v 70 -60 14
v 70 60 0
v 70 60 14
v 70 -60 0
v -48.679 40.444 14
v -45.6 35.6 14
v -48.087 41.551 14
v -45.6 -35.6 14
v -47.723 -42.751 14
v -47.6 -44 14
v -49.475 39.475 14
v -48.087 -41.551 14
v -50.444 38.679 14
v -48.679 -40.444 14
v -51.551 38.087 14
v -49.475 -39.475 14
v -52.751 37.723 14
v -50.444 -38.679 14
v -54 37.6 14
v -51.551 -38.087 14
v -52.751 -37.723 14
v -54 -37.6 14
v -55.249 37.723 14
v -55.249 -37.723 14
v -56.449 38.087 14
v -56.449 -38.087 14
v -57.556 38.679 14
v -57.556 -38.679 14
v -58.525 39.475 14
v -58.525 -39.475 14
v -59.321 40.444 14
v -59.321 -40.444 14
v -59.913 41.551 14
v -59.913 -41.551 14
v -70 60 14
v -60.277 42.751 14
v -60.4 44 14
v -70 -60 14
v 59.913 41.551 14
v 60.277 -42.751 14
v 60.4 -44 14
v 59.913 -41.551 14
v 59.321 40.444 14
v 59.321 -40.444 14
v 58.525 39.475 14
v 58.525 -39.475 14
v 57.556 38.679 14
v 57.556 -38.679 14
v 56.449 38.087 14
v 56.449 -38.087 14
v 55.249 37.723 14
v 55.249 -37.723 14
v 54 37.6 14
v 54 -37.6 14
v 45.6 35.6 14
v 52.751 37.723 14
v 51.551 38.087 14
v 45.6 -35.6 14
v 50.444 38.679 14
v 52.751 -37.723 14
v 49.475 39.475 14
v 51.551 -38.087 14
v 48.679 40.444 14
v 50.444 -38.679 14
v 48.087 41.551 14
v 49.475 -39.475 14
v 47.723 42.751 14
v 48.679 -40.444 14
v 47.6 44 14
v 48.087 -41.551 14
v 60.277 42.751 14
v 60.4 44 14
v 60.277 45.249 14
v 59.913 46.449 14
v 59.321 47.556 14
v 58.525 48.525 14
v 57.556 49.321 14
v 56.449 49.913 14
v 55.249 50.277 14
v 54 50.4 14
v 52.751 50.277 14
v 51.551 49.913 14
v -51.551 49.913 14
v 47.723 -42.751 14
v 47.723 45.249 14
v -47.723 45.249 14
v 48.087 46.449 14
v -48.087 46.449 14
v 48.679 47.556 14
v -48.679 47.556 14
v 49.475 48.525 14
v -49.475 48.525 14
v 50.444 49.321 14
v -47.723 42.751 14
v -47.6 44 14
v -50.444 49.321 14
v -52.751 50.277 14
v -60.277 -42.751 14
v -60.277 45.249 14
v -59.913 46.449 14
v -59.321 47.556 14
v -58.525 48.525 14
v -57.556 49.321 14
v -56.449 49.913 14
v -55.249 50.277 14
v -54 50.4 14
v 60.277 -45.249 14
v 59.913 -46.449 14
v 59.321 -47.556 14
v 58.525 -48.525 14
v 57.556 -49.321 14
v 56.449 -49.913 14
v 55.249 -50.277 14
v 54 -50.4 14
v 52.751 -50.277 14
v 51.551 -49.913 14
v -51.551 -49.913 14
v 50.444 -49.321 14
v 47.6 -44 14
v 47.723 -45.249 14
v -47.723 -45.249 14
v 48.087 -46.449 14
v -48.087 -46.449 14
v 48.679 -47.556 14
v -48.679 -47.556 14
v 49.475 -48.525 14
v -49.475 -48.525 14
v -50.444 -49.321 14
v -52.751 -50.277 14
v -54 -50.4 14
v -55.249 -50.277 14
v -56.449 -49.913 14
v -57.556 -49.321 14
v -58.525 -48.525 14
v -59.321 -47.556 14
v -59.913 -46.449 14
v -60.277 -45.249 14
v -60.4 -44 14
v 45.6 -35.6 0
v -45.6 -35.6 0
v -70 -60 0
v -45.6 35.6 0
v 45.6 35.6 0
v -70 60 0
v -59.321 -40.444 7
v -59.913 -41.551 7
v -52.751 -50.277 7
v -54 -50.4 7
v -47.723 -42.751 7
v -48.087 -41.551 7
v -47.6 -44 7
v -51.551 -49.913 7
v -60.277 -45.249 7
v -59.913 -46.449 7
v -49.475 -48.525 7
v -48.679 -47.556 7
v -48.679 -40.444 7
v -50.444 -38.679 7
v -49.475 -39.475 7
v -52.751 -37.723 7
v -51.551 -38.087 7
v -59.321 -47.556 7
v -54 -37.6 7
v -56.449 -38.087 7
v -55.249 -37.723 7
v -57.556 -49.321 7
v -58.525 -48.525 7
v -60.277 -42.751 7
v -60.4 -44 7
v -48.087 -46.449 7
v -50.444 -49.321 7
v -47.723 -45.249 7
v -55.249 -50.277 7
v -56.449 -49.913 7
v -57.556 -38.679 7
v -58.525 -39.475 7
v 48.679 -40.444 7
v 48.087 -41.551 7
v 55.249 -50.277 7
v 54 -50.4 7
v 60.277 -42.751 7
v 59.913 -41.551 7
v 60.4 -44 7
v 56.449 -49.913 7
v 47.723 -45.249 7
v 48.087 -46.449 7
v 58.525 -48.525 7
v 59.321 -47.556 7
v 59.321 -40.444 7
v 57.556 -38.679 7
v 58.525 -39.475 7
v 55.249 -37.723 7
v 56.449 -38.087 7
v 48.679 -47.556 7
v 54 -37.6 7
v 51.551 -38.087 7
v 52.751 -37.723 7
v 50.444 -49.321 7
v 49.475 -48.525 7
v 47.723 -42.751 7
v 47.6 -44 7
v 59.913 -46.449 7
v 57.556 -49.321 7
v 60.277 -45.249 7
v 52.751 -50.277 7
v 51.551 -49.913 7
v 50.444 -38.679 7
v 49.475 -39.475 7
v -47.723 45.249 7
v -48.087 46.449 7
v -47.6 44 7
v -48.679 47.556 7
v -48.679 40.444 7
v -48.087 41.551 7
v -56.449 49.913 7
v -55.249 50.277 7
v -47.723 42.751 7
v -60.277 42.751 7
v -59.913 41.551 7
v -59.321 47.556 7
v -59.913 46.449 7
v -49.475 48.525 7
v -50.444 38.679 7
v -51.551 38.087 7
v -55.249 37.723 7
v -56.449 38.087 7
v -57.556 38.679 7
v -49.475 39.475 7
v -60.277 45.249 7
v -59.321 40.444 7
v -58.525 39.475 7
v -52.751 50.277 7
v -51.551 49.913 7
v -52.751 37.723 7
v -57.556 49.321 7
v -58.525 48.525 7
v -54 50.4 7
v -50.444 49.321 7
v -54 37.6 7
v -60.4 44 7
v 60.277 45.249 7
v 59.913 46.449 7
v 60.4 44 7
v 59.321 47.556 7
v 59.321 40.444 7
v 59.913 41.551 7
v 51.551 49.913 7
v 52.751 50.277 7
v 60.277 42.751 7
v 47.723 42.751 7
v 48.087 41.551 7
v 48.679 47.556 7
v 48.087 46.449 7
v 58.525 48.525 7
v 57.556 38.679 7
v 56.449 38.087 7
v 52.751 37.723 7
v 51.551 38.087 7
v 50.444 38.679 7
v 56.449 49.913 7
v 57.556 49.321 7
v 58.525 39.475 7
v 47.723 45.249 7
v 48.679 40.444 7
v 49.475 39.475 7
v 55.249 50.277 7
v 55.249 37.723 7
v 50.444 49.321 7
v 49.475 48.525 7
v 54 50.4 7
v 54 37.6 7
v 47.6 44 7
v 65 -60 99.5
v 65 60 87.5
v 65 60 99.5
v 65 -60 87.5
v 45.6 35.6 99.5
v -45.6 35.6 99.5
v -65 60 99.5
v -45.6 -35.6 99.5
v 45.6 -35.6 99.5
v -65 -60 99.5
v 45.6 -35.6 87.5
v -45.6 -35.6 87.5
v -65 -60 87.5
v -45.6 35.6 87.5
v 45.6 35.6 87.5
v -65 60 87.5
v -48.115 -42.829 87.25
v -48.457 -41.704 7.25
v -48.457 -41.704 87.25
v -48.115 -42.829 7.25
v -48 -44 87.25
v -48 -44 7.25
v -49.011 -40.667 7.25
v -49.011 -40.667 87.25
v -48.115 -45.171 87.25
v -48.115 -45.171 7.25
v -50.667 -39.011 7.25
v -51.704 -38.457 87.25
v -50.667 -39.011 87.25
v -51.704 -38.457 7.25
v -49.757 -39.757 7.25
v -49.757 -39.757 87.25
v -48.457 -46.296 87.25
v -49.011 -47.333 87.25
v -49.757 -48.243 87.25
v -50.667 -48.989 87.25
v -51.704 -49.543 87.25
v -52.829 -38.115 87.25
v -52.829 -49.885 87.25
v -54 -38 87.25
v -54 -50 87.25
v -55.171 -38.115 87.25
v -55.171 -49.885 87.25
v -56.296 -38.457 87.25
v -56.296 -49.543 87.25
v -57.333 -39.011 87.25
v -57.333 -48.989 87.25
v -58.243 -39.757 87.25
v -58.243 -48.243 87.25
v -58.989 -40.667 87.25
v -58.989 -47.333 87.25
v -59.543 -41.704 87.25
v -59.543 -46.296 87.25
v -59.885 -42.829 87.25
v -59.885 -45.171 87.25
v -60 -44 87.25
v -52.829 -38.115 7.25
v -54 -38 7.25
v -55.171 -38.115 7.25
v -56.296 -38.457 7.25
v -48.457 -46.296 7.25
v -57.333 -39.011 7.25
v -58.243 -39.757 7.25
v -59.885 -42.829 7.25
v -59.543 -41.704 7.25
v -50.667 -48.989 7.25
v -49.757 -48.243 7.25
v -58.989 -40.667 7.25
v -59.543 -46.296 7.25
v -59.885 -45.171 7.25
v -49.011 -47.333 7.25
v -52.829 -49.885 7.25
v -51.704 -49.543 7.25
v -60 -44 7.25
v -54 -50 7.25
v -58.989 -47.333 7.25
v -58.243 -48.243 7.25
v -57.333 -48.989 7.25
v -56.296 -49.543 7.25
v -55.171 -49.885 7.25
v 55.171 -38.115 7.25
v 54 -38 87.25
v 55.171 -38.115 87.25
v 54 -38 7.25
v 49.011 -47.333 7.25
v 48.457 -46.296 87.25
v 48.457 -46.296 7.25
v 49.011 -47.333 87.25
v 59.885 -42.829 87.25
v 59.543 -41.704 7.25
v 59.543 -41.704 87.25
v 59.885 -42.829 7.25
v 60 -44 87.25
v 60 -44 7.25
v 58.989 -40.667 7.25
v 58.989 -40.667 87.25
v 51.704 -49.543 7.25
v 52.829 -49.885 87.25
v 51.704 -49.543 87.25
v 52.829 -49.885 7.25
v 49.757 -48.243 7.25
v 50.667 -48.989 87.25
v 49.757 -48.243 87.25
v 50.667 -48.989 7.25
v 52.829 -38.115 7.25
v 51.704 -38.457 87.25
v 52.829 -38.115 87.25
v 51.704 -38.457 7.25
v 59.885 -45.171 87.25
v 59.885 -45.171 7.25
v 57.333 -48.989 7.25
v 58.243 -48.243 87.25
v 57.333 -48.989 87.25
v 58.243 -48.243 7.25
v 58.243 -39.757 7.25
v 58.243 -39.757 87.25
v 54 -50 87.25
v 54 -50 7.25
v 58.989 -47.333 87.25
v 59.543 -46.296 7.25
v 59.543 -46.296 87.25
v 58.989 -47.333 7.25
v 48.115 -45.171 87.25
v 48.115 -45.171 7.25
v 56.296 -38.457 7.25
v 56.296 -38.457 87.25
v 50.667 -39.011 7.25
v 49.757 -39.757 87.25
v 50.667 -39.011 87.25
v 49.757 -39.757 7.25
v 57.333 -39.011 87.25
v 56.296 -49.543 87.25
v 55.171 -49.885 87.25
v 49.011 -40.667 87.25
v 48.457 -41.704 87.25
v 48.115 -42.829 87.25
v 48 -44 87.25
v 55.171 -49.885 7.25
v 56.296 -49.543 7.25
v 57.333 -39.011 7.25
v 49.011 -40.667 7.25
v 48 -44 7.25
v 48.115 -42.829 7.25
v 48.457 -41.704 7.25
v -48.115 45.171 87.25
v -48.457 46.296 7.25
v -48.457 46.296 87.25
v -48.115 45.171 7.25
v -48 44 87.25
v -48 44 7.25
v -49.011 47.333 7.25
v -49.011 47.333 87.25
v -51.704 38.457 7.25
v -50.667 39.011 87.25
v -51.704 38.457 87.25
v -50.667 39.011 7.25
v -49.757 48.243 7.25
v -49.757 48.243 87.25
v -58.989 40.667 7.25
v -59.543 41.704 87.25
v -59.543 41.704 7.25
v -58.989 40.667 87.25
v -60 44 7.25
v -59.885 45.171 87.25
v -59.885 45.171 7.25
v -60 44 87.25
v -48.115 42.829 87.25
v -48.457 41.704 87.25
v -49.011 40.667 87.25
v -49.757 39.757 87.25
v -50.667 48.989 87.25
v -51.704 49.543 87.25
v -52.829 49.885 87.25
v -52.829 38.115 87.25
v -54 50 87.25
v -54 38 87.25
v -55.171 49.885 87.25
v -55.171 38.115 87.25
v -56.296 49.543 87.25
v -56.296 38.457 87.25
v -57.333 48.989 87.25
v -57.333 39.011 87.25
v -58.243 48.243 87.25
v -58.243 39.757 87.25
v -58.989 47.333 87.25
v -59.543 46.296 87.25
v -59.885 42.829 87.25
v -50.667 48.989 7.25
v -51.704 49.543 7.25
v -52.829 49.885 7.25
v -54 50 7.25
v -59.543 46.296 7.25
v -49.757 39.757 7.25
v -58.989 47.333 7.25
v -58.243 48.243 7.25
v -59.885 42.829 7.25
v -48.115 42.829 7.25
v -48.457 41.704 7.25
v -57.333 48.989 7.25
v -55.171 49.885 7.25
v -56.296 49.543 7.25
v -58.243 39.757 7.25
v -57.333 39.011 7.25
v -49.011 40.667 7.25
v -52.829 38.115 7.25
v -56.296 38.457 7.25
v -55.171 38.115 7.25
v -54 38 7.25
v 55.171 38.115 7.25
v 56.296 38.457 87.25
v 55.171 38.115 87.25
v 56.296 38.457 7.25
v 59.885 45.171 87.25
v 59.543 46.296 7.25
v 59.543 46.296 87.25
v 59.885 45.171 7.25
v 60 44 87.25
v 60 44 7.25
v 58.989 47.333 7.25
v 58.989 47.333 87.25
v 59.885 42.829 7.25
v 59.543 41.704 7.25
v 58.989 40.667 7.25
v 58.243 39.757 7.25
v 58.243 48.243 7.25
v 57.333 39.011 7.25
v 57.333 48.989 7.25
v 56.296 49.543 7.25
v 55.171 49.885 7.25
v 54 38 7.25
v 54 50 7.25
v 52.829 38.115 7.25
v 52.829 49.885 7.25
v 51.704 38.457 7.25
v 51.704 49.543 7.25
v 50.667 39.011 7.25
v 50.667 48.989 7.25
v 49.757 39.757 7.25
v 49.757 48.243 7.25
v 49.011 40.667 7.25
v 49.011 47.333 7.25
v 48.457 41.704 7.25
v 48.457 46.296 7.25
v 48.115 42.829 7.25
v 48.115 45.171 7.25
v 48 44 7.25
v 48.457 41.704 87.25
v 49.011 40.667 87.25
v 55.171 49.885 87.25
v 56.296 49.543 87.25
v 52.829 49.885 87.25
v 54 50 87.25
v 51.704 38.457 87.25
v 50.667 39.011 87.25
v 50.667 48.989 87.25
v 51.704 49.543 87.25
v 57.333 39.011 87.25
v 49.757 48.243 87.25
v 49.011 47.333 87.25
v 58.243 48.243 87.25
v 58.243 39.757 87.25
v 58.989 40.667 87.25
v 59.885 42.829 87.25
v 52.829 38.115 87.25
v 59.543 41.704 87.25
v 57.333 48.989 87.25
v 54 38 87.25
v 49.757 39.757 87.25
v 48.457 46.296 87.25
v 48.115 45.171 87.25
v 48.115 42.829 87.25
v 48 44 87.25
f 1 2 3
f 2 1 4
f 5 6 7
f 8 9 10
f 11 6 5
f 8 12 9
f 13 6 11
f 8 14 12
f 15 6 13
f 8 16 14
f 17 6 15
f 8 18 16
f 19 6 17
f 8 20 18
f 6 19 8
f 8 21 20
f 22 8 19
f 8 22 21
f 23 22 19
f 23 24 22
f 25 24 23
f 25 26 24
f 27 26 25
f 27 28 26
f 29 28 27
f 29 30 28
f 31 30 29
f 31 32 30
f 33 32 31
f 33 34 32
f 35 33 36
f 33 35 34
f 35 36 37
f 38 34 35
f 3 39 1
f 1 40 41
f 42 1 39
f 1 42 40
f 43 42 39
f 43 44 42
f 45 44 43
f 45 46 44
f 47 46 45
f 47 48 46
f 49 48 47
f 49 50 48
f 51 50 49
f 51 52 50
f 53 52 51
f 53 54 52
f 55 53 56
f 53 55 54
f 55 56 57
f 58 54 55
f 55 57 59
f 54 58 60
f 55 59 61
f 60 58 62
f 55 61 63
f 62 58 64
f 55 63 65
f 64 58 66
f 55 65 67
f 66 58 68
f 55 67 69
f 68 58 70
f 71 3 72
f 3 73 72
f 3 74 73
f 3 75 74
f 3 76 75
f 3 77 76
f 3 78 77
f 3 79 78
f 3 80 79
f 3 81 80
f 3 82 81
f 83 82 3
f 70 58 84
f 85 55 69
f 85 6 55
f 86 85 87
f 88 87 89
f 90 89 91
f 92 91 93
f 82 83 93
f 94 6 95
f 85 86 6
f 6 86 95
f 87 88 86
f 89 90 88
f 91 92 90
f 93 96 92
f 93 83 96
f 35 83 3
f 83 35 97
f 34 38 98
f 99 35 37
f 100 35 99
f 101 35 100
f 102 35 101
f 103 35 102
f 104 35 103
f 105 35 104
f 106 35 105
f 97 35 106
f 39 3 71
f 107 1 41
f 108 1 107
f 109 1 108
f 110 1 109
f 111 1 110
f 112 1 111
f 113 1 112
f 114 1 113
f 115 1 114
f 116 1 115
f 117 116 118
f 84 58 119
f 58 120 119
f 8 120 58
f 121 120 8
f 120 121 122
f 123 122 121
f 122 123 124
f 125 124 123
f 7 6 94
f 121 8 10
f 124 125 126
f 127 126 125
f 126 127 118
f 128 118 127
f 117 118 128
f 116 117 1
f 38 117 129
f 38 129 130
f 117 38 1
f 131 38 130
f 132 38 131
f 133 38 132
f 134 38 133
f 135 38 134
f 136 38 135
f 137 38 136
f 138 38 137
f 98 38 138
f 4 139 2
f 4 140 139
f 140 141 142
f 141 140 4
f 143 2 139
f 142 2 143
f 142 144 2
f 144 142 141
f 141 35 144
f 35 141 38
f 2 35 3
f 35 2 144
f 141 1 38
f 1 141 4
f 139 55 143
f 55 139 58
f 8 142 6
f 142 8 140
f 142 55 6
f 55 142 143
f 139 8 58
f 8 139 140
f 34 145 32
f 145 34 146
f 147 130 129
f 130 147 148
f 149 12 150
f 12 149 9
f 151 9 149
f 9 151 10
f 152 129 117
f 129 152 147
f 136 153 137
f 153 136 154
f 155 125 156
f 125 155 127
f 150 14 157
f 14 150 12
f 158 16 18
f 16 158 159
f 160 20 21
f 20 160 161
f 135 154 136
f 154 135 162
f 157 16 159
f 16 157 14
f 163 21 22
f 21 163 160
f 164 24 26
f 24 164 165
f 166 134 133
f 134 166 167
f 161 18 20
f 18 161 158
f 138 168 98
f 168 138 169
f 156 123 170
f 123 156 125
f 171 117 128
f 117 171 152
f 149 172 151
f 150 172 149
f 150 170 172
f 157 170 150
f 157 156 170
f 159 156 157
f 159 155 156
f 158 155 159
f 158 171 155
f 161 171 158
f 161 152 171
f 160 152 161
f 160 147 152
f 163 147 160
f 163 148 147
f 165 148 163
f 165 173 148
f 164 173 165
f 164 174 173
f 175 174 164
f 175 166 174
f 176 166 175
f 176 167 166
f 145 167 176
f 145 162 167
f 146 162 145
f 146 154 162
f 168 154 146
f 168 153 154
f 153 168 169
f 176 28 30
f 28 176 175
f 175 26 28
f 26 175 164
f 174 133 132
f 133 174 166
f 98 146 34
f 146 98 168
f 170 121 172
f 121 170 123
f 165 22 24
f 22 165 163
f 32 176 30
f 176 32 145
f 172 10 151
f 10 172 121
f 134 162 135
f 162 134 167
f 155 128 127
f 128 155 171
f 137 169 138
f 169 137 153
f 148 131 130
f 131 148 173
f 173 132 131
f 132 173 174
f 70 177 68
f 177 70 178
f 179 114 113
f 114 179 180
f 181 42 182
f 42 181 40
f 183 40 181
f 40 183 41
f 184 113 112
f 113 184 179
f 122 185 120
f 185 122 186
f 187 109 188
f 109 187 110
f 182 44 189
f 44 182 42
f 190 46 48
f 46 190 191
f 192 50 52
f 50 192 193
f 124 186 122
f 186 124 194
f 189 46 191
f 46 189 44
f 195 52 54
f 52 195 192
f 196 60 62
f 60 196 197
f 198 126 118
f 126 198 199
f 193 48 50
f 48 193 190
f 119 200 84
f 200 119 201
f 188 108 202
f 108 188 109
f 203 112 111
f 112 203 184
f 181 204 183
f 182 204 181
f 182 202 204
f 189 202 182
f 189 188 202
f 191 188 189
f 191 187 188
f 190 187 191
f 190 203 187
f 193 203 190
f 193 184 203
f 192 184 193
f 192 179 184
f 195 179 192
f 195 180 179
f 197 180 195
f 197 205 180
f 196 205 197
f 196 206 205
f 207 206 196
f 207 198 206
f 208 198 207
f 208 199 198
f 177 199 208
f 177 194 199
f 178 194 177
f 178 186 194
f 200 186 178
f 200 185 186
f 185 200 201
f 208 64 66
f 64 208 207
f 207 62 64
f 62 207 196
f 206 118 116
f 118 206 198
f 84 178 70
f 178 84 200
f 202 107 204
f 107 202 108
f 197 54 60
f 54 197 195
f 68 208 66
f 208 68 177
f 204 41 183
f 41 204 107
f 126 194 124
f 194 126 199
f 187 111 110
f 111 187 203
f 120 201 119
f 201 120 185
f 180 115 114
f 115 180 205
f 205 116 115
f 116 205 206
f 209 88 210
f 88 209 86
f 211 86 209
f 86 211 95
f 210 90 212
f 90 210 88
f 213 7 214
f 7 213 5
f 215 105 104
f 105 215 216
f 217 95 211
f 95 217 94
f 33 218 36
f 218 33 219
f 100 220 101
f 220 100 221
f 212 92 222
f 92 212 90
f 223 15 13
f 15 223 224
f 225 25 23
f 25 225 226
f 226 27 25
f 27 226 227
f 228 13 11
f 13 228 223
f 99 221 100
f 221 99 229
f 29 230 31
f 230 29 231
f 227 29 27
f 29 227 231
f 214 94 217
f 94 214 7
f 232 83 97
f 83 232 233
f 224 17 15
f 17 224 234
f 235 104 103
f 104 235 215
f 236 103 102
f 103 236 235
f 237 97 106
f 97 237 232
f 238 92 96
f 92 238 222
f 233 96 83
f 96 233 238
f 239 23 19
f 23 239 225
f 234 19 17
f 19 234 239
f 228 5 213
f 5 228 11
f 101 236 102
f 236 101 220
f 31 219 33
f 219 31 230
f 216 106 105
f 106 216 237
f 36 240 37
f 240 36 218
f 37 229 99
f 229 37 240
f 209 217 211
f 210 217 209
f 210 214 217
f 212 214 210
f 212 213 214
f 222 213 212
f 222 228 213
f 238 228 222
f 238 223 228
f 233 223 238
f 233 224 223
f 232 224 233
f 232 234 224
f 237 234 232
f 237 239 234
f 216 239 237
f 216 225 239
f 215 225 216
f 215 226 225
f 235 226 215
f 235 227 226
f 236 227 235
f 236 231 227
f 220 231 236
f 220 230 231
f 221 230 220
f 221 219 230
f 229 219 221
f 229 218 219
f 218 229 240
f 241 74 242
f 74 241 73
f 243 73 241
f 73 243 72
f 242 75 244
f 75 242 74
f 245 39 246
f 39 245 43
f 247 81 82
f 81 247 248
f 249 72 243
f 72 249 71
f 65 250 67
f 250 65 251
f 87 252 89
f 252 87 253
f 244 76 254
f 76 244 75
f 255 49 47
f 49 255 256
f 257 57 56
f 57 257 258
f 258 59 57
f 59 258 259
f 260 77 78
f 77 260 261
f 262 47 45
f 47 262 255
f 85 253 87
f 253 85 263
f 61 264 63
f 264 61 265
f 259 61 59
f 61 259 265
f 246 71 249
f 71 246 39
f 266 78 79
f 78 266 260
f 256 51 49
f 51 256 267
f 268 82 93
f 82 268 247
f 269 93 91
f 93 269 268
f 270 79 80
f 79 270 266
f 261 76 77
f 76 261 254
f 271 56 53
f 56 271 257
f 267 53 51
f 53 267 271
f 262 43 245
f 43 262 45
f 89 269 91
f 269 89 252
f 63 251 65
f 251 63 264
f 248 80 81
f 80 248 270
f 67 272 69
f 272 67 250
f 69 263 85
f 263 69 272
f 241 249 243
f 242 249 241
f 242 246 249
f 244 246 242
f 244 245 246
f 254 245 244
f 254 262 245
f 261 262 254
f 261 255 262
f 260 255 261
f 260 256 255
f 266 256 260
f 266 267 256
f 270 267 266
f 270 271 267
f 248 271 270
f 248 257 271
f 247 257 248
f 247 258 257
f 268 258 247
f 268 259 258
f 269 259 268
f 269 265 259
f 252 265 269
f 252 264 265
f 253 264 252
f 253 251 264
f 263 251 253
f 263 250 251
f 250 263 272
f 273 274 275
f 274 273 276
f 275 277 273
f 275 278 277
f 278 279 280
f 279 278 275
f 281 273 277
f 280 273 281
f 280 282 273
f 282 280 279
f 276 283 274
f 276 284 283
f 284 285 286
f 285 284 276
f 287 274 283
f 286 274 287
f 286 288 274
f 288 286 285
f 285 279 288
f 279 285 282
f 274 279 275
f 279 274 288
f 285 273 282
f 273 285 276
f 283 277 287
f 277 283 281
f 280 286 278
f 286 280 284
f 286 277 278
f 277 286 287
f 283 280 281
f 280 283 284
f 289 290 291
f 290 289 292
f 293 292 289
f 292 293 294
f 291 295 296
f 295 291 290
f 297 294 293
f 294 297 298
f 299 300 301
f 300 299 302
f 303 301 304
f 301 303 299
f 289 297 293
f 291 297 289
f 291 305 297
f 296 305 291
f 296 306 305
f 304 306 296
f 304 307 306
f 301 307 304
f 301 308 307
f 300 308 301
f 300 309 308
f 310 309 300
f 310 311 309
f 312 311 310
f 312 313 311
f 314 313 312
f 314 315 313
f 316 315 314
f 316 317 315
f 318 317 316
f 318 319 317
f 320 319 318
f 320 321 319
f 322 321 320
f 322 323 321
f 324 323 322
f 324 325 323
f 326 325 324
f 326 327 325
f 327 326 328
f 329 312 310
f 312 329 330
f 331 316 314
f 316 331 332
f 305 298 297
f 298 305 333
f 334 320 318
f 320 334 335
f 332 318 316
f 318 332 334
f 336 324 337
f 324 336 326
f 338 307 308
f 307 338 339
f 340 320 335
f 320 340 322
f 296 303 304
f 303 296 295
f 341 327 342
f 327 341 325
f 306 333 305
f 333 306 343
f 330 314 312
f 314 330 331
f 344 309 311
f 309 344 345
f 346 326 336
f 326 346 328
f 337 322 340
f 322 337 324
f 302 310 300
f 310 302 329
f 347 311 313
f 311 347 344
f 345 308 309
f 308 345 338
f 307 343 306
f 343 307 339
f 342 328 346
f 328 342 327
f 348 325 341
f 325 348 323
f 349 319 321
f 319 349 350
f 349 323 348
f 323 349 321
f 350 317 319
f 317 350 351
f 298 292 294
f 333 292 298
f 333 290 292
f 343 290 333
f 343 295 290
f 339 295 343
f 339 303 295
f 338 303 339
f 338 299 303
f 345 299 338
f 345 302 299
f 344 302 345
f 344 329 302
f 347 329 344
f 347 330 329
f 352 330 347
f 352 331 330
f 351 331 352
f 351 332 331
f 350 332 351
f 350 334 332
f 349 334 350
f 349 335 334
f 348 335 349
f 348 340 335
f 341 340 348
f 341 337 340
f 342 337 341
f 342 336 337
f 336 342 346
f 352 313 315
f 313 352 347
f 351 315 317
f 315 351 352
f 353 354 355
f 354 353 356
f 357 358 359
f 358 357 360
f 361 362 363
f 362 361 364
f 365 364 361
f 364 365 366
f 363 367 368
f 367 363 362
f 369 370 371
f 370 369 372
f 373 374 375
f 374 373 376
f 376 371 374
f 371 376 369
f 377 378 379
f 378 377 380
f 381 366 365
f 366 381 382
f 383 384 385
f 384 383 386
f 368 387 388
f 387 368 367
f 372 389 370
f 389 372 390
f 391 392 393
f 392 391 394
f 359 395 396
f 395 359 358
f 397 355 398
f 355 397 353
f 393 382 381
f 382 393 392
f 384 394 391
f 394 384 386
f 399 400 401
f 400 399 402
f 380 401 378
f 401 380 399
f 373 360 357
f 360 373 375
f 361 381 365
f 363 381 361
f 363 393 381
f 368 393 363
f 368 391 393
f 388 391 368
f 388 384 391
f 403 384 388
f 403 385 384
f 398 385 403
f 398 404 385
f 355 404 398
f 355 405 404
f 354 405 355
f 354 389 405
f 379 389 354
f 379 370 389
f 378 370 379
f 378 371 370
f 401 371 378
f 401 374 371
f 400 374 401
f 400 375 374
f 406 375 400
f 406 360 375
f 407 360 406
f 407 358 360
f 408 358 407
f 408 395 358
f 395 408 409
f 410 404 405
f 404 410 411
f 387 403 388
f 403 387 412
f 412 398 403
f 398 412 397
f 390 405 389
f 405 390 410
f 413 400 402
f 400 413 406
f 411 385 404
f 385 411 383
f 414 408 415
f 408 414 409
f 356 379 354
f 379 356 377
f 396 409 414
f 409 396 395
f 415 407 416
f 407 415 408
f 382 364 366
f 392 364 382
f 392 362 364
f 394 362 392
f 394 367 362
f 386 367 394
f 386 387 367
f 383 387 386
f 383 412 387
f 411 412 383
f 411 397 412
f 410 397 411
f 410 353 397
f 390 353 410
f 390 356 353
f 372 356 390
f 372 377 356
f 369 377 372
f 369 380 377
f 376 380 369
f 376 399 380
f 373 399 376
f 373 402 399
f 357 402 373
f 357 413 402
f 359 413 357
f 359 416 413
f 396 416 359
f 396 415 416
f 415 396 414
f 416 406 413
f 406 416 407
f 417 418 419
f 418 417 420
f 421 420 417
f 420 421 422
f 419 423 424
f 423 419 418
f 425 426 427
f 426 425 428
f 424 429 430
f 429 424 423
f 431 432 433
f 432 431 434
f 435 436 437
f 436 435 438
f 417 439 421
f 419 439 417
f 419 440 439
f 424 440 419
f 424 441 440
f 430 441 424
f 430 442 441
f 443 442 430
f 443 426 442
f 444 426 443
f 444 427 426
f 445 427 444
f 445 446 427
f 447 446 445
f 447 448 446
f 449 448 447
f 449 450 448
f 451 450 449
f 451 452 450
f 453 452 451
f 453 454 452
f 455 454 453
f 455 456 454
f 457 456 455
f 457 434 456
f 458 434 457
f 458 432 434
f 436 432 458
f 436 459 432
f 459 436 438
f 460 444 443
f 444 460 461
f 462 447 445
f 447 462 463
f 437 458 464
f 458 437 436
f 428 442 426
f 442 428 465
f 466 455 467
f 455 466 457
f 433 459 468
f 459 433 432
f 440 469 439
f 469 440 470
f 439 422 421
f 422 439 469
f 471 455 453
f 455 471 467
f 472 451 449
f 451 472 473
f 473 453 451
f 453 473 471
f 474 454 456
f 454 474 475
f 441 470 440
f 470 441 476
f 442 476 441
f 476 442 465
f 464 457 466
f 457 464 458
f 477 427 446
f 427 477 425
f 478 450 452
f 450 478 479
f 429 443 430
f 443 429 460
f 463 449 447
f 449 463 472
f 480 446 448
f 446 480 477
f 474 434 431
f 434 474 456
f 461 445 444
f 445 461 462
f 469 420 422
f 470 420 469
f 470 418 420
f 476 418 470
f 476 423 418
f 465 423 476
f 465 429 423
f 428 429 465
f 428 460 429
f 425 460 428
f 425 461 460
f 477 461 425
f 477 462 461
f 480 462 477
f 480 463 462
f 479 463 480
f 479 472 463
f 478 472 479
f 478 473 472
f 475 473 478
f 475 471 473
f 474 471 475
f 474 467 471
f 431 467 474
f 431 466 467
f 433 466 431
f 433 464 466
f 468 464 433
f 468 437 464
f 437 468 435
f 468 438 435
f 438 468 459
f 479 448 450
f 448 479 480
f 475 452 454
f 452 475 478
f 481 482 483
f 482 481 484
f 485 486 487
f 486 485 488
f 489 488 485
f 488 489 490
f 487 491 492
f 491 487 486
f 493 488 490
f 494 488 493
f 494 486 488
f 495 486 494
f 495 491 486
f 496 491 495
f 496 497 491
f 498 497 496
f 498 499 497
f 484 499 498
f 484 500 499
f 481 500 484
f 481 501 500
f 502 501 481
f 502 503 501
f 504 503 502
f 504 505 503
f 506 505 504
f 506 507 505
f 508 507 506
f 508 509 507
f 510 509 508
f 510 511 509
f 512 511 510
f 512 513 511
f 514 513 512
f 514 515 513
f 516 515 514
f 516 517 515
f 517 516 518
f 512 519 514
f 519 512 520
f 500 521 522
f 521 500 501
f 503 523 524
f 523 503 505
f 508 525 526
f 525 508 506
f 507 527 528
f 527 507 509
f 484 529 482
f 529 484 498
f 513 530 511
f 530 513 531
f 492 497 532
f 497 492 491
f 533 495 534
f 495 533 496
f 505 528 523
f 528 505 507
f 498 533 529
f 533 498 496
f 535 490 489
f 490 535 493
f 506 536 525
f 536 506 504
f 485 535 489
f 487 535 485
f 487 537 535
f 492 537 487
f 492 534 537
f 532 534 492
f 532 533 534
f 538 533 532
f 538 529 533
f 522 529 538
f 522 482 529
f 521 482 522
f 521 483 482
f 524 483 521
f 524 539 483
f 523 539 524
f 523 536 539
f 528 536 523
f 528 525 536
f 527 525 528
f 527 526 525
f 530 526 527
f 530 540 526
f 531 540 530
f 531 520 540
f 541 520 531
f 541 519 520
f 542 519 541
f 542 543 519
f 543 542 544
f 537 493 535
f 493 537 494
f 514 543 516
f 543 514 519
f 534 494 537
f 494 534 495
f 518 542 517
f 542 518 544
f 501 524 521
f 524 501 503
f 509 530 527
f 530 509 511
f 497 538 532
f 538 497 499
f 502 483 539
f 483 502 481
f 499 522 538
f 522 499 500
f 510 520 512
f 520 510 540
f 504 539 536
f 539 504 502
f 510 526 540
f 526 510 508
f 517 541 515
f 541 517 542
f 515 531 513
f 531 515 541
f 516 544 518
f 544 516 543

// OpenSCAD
$fn = 32;

// ------------------------------------------------------------------------
// Frame cube: base 140 x 120 mm, posts 80 mm tall
// Every part is its own module, assembly() places every instance.
// ------------------------------------------------------------------------

// --- part 1 ---
module base_frame() {
  difference() {
    translate([-70, -60, 0]) cube([140, 120, 14]);
    translate([-45.6, -35.6, -1]) cube([91.2, 71.2, 16]);
    translate([-54, -44, 7]) cylinder(h = 8, d = 12.8);
    translate([54, -44, 7]) cylinder(h = 8, d = 12.8);
    translate([-54, 44, 7]) cylinder(h = 8, d = 12.8);
    translate([54, 44, 7]) cylinder(h = 8, d = 12.8);
  }
}

// --- part 2 ---
module corner_post() {
  cylinder(h = 80, d = 12);
}

// --- part 3 ---
module top_frame() {
  difference() {
    translate([-65, -60, 0]) cube([130, 120, 12]);
    translate([-45.6, -35.6, -1]) cube([91.2, 71.2, 14]);
  }
}

// --- assembly ---
module assembly() {
  color([0.80, 0.24, 0.20]) translate([0, 0, 0]) rotate([0, 0, 0]) base_frame();
  color([0.20, 0.45, 0.75]) translate([-54, -44, 7.25]) rotate([0, 0, 0]) corner_post();
  color([0.25, 0.62, 0.32]) translate([54, -44, 7.25]) rotate([0, 0, 0]) corner_post();
  color([0.92, 0.70, 0.18]) translate([-54, 44, 7.25]) rotate([0, 0, 0]) corner_post();
  color([0.58, 0.35, 0.70]) translate([54, 44, 7.25]) rotate([0, 0, 0]) corner_post();
  color([0.16, 0.66, 0.66]) translate([0, 0, 87.5]) rotate([0, 0, 0]) top_frame();
}

assembly();
